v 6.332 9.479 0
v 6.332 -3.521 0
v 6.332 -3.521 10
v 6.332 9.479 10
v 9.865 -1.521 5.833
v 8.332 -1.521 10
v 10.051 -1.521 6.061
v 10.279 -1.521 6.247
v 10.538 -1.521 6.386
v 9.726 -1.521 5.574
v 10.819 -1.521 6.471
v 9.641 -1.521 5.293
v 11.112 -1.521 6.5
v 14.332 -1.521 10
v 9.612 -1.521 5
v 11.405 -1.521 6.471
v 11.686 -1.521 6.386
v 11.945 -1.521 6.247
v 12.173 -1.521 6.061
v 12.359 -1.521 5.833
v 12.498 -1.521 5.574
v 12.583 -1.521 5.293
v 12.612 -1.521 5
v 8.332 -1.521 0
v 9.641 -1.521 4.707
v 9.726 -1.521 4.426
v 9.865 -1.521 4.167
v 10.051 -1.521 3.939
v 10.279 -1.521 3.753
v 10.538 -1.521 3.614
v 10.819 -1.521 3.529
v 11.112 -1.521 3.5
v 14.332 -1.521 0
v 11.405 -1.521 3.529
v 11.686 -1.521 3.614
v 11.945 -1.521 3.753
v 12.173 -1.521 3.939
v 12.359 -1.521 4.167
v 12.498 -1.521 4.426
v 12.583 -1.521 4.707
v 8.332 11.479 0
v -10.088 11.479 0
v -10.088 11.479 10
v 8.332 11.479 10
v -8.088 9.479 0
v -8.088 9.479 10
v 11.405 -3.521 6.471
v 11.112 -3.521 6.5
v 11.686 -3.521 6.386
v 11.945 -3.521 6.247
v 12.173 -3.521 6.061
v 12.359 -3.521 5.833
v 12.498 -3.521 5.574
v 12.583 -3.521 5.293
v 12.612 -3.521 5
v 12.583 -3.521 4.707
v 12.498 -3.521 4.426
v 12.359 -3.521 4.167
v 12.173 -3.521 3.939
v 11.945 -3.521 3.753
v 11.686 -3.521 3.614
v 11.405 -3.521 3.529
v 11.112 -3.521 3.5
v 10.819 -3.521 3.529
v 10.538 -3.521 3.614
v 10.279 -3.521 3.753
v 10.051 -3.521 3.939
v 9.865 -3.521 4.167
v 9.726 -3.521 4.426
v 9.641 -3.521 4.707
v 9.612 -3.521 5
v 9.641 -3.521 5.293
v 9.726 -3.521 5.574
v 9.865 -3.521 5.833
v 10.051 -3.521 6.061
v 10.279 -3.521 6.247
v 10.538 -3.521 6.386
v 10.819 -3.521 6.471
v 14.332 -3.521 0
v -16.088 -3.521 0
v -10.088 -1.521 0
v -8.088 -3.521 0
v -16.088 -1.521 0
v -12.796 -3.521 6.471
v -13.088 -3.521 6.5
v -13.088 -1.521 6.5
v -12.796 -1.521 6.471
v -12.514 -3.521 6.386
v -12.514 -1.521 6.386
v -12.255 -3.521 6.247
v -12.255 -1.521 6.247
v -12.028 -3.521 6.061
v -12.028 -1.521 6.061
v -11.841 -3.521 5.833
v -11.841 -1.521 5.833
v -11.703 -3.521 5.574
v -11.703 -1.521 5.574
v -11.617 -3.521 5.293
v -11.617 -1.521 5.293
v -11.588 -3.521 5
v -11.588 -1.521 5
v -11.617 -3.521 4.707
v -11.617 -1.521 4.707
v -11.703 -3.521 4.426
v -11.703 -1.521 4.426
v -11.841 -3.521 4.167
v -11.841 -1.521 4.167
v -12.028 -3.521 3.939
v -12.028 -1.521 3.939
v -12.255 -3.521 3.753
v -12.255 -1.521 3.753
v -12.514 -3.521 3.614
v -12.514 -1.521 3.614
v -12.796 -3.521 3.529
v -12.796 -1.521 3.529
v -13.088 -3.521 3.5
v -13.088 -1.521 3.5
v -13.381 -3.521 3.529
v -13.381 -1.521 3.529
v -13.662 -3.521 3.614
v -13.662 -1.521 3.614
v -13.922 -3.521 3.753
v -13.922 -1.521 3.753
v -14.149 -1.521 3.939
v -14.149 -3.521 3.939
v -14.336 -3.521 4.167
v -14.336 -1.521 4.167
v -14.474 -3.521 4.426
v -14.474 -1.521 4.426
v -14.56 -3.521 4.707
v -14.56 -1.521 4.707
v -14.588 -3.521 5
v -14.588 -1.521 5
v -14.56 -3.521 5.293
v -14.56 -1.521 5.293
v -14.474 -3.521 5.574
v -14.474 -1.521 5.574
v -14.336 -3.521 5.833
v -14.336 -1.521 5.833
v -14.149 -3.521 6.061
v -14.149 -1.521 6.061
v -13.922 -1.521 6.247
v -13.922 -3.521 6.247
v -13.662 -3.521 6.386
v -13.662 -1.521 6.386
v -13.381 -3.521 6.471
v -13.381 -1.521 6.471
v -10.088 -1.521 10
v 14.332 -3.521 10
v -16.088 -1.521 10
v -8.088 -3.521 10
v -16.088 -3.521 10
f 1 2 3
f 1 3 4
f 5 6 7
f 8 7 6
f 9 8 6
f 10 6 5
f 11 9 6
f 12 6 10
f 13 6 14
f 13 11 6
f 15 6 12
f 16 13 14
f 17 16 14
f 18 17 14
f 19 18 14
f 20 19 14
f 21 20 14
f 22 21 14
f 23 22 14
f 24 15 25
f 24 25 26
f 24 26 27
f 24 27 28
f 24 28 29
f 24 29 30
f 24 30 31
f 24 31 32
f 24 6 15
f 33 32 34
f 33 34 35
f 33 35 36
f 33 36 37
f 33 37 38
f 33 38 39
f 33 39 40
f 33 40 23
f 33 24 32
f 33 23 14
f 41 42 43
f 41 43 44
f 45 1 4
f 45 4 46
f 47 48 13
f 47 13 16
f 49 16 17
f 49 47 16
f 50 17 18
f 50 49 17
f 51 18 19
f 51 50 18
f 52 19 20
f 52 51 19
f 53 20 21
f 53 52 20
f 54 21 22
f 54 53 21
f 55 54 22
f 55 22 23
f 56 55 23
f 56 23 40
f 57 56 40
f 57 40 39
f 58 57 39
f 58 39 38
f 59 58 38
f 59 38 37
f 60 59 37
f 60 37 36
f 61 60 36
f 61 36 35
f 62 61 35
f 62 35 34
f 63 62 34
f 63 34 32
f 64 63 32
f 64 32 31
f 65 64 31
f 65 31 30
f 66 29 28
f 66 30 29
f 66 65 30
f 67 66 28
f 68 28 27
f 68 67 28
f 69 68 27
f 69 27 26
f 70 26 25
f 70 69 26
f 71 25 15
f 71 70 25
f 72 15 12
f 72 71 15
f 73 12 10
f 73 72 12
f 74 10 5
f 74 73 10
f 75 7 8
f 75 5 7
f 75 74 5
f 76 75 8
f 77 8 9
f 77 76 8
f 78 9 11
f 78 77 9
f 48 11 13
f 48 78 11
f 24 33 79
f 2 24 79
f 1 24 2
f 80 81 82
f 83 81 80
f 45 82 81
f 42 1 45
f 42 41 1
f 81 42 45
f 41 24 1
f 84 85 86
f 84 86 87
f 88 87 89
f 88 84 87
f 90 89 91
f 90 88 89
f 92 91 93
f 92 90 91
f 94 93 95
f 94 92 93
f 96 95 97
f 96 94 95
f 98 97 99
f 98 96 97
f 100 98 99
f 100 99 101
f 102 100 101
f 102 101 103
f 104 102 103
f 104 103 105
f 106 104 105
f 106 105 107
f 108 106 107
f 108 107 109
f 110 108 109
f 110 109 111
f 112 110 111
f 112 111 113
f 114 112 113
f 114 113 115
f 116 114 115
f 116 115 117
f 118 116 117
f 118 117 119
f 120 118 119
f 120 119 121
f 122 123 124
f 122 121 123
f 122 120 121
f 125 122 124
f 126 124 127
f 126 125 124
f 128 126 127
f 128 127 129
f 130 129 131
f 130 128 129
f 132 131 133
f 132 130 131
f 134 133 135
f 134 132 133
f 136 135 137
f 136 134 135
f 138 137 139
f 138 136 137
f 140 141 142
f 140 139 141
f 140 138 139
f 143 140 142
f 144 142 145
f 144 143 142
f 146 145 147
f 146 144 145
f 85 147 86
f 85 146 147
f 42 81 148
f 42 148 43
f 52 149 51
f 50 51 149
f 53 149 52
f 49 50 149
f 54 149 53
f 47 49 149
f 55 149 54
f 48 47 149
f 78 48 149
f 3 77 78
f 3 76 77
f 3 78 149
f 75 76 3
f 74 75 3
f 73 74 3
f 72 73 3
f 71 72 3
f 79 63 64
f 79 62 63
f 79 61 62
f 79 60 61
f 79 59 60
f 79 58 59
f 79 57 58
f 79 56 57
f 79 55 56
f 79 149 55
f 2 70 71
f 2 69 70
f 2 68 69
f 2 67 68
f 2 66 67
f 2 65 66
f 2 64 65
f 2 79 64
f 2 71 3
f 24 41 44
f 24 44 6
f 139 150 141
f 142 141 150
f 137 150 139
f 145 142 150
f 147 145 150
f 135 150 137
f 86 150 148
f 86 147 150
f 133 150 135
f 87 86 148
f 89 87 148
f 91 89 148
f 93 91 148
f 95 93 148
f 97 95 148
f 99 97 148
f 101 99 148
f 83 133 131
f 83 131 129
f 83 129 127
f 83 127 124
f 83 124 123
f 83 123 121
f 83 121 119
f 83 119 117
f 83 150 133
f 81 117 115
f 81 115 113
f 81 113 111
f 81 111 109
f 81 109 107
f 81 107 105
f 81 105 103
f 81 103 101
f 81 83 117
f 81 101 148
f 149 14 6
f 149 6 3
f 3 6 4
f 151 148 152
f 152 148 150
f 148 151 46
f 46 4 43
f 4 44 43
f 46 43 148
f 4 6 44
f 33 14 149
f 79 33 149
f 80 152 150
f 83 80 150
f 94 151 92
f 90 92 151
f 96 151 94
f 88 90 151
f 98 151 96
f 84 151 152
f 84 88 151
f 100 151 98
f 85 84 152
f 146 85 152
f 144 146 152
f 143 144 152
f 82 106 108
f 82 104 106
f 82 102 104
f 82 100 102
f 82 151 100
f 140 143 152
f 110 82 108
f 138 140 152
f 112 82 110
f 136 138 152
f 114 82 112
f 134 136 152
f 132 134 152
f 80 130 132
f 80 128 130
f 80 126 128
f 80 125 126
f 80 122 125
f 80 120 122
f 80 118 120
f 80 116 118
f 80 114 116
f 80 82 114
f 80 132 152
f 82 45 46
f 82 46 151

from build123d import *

# Parameters (mm, degrees)
BOSS_EXTRUDE1_DEPTH     = 10
CUT_EXTRUDE1_DEPTH      = 23.974660823
CUT_EXTRUDE1_DEPTH_BACK = 23.974660823
SKETCH2_R               = 1.5


with BuildPart() as part:
    # Sketch1 → Boss-Extrude1 (new body)
    with BuildSketch(Plane.XY):
        Polygon((-16.088351064, -3.521010638), (-16.088351064, -1.521010638), (-10.088351064, -1.521010638), (-10.088351064, 11.478989362), (8.331648936, 11.478989362), (8.331648936, -1.521010638), (14.331648936, -1.521010638), (14.331648936, -3.521010638), (6.331648936, -3.521010638), (6.331648936, 9.478989362), (-8.088351064, 9.478989362), (-8.088351064, -3.521010638), align=None)
    extrude(amount=BOSS_EXTRUDE1_DEPTH)

    # Sketch2 → Cut-Extrude1 (cut, two sides: drawn at the far end of the back side and taken through both)
    with BuildSketch(Plane(origin=(0, -1.521010638, 0), x_dir=(1, 0, 0), z_dir=(0, 1, 0)).offset(-CUT_EXTRUDE1_DEPTH_BACK)):
        with Locations(Location((-13.088351064, -5, 0), (0, 0, 270))):
            Circle(SKETCH2_R)
        with Locations(Location((11.112056512, -5, 0), (0, 0, 270))):
            Circle(SKETCH2_R)
    extrude(amount=CUT_EXTRUDE1_DEPTH + CUT_EXTRUDE1_DEPTH_BACK, mode=Mode.SUBTRACT)


solid = part.part
